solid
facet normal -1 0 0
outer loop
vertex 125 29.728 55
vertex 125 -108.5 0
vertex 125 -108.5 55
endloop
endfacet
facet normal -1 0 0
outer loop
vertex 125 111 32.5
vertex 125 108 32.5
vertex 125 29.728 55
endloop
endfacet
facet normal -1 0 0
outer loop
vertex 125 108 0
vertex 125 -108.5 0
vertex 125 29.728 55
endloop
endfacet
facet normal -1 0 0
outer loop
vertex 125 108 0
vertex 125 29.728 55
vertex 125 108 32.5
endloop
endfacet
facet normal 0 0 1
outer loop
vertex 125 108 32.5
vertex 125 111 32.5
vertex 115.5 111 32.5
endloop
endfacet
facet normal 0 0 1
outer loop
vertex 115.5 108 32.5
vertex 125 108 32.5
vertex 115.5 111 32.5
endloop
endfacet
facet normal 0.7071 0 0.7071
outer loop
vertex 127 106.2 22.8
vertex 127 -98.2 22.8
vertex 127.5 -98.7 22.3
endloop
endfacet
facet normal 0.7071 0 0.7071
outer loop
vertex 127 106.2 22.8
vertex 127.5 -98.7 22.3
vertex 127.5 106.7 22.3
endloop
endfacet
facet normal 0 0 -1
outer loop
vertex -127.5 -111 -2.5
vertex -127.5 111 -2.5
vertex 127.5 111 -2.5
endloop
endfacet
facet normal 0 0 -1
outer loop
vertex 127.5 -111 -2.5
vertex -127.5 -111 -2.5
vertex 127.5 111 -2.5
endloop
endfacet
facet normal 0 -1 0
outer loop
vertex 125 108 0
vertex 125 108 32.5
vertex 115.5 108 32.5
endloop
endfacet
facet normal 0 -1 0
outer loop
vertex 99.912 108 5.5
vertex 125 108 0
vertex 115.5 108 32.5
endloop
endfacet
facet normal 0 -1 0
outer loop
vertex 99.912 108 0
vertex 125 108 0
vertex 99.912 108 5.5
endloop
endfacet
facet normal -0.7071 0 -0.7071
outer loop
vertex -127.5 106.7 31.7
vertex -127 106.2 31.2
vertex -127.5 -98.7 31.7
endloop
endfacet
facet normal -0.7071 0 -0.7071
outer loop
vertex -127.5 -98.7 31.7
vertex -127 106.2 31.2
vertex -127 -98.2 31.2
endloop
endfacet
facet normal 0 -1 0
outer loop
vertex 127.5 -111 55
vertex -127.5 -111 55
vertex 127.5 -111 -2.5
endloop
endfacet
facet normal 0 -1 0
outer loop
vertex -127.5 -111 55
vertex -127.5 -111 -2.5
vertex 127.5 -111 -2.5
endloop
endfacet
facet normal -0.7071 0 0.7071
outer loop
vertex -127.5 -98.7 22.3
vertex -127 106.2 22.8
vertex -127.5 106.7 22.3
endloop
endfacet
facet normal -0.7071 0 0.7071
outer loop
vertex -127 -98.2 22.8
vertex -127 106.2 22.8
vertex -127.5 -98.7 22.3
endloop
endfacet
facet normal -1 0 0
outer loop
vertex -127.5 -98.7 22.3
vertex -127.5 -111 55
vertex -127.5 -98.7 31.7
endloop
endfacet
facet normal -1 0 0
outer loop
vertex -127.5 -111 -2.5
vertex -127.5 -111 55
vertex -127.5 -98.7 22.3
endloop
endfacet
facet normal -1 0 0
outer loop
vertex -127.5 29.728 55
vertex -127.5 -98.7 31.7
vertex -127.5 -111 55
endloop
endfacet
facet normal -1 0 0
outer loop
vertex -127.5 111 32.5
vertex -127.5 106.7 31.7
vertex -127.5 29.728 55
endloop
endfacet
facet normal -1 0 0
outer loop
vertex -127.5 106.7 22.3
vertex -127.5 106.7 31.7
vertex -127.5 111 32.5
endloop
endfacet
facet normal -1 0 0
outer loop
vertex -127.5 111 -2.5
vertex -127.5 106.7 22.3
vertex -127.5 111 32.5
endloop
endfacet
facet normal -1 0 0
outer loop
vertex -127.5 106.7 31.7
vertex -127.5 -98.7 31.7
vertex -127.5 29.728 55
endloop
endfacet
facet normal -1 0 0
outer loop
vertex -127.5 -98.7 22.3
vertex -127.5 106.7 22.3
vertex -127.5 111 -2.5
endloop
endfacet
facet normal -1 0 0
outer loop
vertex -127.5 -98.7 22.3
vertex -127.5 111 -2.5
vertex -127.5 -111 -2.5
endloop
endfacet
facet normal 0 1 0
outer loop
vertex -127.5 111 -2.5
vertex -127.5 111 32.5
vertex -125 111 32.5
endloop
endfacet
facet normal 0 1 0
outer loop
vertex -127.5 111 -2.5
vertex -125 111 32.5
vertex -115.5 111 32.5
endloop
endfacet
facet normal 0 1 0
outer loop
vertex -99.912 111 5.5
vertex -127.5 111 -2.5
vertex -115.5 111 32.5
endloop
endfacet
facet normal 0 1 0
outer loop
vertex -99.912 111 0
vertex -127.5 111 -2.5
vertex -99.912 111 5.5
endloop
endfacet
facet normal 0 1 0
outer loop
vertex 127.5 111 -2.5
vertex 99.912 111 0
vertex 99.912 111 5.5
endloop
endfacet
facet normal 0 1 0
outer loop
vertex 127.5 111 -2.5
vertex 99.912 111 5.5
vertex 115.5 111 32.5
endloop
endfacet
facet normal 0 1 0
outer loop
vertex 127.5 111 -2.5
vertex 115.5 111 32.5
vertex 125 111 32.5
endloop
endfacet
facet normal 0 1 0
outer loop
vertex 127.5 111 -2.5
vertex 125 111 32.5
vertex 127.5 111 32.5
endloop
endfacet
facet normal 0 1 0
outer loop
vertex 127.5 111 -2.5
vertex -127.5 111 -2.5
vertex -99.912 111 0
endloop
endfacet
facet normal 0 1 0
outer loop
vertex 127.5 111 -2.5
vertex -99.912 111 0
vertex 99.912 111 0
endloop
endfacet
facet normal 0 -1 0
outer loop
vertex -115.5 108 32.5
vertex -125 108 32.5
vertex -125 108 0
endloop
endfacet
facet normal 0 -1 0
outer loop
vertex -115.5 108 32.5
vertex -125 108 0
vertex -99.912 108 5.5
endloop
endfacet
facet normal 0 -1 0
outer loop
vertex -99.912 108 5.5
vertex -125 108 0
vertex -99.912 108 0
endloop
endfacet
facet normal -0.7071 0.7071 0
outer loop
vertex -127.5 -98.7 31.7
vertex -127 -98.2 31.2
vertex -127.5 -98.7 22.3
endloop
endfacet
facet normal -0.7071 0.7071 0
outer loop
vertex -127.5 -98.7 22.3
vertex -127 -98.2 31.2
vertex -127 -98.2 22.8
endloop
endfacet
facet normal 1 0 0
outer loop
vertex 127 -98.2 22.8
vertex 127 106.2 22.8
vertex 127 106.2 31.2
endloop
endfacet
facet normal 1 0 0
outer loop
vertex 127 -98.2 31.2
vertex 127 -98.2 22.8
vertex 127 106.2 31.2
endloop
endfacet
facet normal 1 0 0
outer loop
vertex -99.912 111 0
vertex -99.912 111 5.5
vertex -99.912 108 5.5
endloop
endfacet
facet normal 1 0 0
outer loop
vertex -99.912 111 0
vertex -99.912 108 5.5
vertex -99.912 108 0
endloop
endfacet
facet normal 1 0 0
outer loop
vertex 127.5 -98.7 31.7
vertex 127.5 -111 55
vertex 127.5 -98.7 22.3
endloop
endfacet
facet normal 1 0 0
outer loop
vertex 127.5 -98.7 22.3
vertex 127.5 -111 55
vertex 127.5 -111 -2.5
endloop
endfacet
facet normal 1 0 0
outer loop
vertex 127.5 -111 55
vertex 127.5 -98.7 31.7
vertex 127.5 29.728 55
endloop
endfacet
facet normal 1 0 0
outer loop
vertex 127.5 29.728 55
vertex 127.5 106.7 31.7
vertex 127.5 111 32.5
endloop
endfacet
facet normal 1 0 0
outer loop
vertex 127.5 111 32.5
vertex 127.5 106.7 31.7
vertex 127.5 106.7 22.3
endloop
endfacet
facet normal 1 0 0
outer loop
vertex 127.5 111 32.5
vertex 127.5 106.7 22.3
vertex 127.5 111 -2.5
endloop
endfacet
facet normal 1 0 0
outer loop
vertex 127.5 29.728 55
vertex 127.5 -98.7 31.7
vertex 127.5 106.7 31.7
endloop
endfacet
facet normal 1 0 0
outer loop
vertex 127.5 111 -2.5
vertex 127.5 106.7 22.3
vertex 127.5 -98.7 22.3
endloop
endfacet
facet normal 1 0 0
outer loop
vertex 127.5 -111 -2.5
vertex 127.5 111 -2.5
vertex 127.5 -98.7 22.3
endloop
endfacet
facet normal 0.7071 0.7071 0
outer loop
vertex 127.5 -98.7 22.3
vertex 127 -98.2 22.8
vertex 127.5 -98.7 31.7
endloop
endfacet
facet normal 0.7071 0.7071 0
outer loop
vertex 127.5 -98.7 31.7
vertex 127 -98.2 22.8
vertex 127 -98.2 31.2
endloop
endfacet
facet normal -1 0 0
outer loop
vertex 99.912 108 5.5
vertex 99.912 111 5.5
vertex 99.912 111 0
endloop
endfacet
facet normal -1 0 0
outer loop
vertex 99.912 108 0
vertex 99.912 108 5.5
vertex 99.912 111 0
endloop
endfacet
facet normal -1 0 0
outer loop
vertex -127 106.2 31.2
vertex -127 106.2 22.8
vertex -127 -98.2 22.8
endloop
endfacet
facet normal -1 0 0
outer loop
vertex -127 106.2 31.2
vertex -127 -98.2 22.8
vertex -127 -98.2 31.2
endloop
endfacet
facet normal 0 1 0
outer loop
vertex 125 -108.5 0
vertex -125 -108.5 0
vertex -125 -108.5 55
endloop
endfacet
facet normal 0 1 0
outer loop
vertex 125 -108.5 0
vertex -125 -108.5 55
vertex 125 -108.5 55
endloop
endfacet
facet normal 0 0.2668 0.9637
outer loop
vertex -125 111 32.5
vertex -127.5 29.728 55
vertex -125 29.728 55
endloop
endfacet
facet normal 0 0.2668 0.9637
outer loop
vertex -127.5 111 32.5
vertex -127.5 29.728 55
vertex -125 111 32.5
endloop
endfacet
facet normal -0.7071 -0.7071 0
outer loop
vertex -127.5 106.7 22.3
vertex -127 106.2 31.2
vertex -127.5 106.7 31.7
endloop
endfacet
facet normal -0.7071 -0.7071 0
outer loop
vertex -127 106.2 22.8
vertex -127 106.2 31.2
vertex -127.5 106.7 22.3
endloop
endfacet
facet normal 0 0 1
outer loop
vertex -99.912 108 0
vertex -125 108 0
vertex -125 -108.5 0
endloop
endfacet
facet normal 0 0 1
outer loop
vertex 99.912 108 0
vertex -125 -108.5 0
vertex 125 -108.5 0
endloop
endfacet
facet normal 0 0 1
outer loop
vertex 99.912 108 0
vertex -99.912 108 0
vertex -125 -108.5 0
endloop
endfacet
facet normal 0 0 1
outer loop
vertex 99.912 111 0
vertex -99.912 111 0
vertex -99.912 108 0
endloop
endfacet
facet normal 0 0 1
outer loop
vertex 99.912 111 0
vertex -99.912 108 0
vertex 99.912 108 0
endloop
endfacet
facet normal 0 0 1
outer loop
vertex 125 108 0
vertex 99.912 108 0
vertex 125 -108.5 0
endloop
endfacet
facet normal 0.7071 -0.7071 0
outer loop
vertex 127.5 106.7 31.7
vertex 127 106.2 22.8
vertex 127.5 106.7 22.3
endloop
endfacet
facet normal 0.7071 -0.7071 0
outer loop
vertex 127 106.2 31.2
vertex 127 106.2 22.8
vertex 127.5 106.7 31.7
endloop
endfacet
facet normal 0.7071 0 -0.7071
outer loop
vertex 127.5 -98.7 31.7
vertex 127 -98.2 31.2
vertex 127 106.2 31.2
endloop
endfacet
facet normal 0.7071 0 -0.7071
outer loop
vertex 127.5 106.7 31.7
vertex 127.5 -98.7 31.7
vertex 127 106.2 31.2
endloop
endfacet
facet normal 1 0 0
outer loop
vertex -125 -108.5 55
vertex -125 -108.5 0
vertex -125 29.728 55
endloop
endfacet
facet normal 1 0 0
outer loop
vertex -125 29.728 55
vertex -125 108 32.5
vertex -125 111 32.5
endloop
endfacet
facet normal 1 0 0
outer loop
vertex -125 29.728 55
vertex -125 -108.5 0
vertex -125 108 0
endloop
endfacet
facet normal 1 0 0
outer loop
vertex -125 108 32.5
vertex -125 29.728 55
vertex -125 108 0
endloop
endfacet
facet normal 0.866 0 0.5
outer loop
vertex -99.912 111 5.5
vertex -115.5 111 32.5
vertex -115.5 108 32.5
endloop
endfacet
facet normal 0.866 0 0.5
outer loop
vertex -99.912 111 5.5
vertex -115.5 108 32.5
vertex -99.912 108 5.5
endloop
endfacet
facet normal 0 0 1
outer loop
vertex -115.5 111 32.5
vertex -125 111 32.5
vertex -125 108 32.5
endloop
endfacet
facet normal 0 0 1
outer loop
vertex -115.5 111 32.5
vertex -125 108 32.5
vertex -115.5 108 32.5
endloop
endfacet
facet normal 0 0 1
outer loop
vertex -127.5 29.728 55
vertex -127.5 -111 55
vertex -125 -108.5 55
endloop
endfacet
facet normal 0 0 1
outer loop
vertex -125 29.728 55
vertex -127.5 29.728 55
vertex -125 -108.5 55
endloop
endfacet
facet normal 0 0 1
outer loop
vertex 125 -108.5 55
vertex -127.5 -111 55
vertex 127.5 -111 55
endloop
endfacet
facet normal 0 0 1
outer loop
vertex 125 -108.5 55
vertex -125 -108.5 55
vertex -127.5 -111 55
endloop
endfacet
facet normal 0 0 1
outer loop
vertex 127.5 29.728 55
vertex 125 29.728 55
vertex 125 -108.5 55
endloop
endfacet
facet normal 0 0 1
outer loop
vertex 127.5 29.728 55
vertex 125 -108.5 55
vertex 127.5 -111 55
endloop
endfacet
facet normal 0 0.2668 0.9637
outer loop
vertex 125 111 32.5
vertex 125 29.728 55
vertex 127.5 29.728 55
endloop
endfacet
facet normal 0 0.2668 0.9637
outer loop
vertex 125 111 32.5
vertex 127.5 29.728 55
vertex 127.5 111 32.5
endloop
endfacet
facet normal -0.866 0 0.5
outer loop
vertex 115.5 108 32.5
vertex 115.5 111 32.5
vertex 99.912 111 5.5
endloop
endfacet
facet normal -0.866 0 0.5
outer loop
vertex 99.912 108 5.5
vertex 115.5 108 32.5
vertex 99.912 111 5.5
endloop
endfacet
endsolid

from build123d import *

# Parameters (mm, degrees)
SKETCH1_W                               = 255
SKETCH1_H                               = 222
BOSS_EXTRUDE1_DEPTH                     = 2.5
SKETCH2_W                               = 2.5
SKETCH2_H                               = 222
SKETCH2_W_2                             = 250
SKETCH2_H_2                             = 2.5
BOSS_EXTRUDE2_DEPTH                     = 55
HOLD_TAB_DEPTH                          = 3
FRONT_TAPER_DEPTH                       = 178.770216853
FRONT_TAPER_DEPTH_BACK                  = 178.770216853
SKETCH6_W                               = 8.4
SKETCH6_H                               = 204.4
MOUNTING_POCKET_DEPTH                   = 284.048140782
PRINT_CHAMFERS_SIZE                     = 0.5
PRINT_CHAMFERS_OF_MOUNTING_POCKETS_SIZE = 0.5


with BuildPart() as part:
    # Sketch1 → Boss-Extrude1 (new body)
    with BuildSketch(Plane.XY):
        Rectangle(SKETCH1_W, SKETCH1_H)
    extrude(amount=-BOSS_EXTRUDE1_DEPTH)

    # Sketch2 → Boss-Extrude2 (add)
    with BuildSketch(Plane.XY):
        with Locations((-126.25, 0)):
            Rectangle(SKETCH2_W, SKETCH2_H)
        with Locations((0, -109.75)):
            Rectangle(SKETCH2_W_2, SKETCH2_H_2)
        with Locations((126.25, 0)):
            Rectangle(SKETCH2_W, SKETCH2_H)
    extrude(amount=BOSS_EXTRUDE2_DEPTH)

    # Sketch4 → Hold Tab (add)
    with BuildSketch(Plane(origin=(0, 111, 0), x_dir=(1, 0, 0), z_dir=(0, 1, 0))):
        Polygon((127.5, 2.5), (127.5, -32.5), (115.5, -32.5), (99.911542732, -5.5), (99.911542732, 2.5), align=None)
    hold_tab = extrude(amount=-HOLD_TAB_DEPTH)

    # Hold Tabs: Hold Tab across plane
    add(hold_tab.mirror(Plane(origin=(0, 0, 0), x_dir=(0, 0, 1), z_dir=(1, 0, 0))))

    # Sketch5 → Front Taper (cut, two sides: drawn at the far end of the back side and taken through both)
    with BuildSketch(Plane(origin=(0, 0, 0), x_dir=(0, 0, -1), z_dir=(1, 0, 0)).offset(-FRONT_TAPER_DEPTH_BACK)):
        Polygon((-55, 29.727996643), (-32.5, 111), (-55, 111), align=None)
    extrude(amount=FRONT_TAPER_DEPTH + FRONT_TAPER_DEPTH_BACK, mode=Mode.SUBTRACT)

    # Sketch6 → Mounting Pocket (cut, through all)
    with BuildSketch(Plane.ZY.offset(-127)):
        with Locations((27, 4)):
            Rectangle(SKETCH6_W, SKETCH6_H)
    mounting_pocket = extrude(amount=-MOUNTING_POCKET_DEPTH, mode=Mode.SUBTRACT)

    # Print Chamfers
    print_chamfers_edges = [part.edges().sort_by_distance(p)[0] for p in [
        (127.5, 106.2, 27),
        (127.5, 4, 22.8),
        (127.5, -98.2, 27),
        (127.5, 4, 31.2),
    ]]
    chamfer(print_chamfers_edges, length=PRINT_CHAMFERS_SIZE - 0.0001)  # a hair under: the kernel refuses the full size

    # Mounting Pockets: Mounting Pocket across plane
    add(mounting_pocket.mirror(Plane(origin=(0, 0, 0), x_dir=(0, 0, 1), z_dir=(1, 0, 0))), mode=Mode.SUBTRACT)

    # Print Chamfers of Mounting Pockets
    print_chamfers_of_mounting_pockets_edges = [part.edges().sort_by_distance(p)[0] for p in [
        (-127.5, 106.2, 27),
        (-127.5, 4, 22.8),
        (-127.5, -98.2, 27),
        (-127.5, 4, 31.2),
    ]]
    chamfer(print_chamfers_of_mounting_pockets_edges, length=PRINT_CHAMFERS_OF_MOUNTING_POCKETS_SIZE - 0.0001)  # a hair under: the kernel refuses the full size


solid = part.part
